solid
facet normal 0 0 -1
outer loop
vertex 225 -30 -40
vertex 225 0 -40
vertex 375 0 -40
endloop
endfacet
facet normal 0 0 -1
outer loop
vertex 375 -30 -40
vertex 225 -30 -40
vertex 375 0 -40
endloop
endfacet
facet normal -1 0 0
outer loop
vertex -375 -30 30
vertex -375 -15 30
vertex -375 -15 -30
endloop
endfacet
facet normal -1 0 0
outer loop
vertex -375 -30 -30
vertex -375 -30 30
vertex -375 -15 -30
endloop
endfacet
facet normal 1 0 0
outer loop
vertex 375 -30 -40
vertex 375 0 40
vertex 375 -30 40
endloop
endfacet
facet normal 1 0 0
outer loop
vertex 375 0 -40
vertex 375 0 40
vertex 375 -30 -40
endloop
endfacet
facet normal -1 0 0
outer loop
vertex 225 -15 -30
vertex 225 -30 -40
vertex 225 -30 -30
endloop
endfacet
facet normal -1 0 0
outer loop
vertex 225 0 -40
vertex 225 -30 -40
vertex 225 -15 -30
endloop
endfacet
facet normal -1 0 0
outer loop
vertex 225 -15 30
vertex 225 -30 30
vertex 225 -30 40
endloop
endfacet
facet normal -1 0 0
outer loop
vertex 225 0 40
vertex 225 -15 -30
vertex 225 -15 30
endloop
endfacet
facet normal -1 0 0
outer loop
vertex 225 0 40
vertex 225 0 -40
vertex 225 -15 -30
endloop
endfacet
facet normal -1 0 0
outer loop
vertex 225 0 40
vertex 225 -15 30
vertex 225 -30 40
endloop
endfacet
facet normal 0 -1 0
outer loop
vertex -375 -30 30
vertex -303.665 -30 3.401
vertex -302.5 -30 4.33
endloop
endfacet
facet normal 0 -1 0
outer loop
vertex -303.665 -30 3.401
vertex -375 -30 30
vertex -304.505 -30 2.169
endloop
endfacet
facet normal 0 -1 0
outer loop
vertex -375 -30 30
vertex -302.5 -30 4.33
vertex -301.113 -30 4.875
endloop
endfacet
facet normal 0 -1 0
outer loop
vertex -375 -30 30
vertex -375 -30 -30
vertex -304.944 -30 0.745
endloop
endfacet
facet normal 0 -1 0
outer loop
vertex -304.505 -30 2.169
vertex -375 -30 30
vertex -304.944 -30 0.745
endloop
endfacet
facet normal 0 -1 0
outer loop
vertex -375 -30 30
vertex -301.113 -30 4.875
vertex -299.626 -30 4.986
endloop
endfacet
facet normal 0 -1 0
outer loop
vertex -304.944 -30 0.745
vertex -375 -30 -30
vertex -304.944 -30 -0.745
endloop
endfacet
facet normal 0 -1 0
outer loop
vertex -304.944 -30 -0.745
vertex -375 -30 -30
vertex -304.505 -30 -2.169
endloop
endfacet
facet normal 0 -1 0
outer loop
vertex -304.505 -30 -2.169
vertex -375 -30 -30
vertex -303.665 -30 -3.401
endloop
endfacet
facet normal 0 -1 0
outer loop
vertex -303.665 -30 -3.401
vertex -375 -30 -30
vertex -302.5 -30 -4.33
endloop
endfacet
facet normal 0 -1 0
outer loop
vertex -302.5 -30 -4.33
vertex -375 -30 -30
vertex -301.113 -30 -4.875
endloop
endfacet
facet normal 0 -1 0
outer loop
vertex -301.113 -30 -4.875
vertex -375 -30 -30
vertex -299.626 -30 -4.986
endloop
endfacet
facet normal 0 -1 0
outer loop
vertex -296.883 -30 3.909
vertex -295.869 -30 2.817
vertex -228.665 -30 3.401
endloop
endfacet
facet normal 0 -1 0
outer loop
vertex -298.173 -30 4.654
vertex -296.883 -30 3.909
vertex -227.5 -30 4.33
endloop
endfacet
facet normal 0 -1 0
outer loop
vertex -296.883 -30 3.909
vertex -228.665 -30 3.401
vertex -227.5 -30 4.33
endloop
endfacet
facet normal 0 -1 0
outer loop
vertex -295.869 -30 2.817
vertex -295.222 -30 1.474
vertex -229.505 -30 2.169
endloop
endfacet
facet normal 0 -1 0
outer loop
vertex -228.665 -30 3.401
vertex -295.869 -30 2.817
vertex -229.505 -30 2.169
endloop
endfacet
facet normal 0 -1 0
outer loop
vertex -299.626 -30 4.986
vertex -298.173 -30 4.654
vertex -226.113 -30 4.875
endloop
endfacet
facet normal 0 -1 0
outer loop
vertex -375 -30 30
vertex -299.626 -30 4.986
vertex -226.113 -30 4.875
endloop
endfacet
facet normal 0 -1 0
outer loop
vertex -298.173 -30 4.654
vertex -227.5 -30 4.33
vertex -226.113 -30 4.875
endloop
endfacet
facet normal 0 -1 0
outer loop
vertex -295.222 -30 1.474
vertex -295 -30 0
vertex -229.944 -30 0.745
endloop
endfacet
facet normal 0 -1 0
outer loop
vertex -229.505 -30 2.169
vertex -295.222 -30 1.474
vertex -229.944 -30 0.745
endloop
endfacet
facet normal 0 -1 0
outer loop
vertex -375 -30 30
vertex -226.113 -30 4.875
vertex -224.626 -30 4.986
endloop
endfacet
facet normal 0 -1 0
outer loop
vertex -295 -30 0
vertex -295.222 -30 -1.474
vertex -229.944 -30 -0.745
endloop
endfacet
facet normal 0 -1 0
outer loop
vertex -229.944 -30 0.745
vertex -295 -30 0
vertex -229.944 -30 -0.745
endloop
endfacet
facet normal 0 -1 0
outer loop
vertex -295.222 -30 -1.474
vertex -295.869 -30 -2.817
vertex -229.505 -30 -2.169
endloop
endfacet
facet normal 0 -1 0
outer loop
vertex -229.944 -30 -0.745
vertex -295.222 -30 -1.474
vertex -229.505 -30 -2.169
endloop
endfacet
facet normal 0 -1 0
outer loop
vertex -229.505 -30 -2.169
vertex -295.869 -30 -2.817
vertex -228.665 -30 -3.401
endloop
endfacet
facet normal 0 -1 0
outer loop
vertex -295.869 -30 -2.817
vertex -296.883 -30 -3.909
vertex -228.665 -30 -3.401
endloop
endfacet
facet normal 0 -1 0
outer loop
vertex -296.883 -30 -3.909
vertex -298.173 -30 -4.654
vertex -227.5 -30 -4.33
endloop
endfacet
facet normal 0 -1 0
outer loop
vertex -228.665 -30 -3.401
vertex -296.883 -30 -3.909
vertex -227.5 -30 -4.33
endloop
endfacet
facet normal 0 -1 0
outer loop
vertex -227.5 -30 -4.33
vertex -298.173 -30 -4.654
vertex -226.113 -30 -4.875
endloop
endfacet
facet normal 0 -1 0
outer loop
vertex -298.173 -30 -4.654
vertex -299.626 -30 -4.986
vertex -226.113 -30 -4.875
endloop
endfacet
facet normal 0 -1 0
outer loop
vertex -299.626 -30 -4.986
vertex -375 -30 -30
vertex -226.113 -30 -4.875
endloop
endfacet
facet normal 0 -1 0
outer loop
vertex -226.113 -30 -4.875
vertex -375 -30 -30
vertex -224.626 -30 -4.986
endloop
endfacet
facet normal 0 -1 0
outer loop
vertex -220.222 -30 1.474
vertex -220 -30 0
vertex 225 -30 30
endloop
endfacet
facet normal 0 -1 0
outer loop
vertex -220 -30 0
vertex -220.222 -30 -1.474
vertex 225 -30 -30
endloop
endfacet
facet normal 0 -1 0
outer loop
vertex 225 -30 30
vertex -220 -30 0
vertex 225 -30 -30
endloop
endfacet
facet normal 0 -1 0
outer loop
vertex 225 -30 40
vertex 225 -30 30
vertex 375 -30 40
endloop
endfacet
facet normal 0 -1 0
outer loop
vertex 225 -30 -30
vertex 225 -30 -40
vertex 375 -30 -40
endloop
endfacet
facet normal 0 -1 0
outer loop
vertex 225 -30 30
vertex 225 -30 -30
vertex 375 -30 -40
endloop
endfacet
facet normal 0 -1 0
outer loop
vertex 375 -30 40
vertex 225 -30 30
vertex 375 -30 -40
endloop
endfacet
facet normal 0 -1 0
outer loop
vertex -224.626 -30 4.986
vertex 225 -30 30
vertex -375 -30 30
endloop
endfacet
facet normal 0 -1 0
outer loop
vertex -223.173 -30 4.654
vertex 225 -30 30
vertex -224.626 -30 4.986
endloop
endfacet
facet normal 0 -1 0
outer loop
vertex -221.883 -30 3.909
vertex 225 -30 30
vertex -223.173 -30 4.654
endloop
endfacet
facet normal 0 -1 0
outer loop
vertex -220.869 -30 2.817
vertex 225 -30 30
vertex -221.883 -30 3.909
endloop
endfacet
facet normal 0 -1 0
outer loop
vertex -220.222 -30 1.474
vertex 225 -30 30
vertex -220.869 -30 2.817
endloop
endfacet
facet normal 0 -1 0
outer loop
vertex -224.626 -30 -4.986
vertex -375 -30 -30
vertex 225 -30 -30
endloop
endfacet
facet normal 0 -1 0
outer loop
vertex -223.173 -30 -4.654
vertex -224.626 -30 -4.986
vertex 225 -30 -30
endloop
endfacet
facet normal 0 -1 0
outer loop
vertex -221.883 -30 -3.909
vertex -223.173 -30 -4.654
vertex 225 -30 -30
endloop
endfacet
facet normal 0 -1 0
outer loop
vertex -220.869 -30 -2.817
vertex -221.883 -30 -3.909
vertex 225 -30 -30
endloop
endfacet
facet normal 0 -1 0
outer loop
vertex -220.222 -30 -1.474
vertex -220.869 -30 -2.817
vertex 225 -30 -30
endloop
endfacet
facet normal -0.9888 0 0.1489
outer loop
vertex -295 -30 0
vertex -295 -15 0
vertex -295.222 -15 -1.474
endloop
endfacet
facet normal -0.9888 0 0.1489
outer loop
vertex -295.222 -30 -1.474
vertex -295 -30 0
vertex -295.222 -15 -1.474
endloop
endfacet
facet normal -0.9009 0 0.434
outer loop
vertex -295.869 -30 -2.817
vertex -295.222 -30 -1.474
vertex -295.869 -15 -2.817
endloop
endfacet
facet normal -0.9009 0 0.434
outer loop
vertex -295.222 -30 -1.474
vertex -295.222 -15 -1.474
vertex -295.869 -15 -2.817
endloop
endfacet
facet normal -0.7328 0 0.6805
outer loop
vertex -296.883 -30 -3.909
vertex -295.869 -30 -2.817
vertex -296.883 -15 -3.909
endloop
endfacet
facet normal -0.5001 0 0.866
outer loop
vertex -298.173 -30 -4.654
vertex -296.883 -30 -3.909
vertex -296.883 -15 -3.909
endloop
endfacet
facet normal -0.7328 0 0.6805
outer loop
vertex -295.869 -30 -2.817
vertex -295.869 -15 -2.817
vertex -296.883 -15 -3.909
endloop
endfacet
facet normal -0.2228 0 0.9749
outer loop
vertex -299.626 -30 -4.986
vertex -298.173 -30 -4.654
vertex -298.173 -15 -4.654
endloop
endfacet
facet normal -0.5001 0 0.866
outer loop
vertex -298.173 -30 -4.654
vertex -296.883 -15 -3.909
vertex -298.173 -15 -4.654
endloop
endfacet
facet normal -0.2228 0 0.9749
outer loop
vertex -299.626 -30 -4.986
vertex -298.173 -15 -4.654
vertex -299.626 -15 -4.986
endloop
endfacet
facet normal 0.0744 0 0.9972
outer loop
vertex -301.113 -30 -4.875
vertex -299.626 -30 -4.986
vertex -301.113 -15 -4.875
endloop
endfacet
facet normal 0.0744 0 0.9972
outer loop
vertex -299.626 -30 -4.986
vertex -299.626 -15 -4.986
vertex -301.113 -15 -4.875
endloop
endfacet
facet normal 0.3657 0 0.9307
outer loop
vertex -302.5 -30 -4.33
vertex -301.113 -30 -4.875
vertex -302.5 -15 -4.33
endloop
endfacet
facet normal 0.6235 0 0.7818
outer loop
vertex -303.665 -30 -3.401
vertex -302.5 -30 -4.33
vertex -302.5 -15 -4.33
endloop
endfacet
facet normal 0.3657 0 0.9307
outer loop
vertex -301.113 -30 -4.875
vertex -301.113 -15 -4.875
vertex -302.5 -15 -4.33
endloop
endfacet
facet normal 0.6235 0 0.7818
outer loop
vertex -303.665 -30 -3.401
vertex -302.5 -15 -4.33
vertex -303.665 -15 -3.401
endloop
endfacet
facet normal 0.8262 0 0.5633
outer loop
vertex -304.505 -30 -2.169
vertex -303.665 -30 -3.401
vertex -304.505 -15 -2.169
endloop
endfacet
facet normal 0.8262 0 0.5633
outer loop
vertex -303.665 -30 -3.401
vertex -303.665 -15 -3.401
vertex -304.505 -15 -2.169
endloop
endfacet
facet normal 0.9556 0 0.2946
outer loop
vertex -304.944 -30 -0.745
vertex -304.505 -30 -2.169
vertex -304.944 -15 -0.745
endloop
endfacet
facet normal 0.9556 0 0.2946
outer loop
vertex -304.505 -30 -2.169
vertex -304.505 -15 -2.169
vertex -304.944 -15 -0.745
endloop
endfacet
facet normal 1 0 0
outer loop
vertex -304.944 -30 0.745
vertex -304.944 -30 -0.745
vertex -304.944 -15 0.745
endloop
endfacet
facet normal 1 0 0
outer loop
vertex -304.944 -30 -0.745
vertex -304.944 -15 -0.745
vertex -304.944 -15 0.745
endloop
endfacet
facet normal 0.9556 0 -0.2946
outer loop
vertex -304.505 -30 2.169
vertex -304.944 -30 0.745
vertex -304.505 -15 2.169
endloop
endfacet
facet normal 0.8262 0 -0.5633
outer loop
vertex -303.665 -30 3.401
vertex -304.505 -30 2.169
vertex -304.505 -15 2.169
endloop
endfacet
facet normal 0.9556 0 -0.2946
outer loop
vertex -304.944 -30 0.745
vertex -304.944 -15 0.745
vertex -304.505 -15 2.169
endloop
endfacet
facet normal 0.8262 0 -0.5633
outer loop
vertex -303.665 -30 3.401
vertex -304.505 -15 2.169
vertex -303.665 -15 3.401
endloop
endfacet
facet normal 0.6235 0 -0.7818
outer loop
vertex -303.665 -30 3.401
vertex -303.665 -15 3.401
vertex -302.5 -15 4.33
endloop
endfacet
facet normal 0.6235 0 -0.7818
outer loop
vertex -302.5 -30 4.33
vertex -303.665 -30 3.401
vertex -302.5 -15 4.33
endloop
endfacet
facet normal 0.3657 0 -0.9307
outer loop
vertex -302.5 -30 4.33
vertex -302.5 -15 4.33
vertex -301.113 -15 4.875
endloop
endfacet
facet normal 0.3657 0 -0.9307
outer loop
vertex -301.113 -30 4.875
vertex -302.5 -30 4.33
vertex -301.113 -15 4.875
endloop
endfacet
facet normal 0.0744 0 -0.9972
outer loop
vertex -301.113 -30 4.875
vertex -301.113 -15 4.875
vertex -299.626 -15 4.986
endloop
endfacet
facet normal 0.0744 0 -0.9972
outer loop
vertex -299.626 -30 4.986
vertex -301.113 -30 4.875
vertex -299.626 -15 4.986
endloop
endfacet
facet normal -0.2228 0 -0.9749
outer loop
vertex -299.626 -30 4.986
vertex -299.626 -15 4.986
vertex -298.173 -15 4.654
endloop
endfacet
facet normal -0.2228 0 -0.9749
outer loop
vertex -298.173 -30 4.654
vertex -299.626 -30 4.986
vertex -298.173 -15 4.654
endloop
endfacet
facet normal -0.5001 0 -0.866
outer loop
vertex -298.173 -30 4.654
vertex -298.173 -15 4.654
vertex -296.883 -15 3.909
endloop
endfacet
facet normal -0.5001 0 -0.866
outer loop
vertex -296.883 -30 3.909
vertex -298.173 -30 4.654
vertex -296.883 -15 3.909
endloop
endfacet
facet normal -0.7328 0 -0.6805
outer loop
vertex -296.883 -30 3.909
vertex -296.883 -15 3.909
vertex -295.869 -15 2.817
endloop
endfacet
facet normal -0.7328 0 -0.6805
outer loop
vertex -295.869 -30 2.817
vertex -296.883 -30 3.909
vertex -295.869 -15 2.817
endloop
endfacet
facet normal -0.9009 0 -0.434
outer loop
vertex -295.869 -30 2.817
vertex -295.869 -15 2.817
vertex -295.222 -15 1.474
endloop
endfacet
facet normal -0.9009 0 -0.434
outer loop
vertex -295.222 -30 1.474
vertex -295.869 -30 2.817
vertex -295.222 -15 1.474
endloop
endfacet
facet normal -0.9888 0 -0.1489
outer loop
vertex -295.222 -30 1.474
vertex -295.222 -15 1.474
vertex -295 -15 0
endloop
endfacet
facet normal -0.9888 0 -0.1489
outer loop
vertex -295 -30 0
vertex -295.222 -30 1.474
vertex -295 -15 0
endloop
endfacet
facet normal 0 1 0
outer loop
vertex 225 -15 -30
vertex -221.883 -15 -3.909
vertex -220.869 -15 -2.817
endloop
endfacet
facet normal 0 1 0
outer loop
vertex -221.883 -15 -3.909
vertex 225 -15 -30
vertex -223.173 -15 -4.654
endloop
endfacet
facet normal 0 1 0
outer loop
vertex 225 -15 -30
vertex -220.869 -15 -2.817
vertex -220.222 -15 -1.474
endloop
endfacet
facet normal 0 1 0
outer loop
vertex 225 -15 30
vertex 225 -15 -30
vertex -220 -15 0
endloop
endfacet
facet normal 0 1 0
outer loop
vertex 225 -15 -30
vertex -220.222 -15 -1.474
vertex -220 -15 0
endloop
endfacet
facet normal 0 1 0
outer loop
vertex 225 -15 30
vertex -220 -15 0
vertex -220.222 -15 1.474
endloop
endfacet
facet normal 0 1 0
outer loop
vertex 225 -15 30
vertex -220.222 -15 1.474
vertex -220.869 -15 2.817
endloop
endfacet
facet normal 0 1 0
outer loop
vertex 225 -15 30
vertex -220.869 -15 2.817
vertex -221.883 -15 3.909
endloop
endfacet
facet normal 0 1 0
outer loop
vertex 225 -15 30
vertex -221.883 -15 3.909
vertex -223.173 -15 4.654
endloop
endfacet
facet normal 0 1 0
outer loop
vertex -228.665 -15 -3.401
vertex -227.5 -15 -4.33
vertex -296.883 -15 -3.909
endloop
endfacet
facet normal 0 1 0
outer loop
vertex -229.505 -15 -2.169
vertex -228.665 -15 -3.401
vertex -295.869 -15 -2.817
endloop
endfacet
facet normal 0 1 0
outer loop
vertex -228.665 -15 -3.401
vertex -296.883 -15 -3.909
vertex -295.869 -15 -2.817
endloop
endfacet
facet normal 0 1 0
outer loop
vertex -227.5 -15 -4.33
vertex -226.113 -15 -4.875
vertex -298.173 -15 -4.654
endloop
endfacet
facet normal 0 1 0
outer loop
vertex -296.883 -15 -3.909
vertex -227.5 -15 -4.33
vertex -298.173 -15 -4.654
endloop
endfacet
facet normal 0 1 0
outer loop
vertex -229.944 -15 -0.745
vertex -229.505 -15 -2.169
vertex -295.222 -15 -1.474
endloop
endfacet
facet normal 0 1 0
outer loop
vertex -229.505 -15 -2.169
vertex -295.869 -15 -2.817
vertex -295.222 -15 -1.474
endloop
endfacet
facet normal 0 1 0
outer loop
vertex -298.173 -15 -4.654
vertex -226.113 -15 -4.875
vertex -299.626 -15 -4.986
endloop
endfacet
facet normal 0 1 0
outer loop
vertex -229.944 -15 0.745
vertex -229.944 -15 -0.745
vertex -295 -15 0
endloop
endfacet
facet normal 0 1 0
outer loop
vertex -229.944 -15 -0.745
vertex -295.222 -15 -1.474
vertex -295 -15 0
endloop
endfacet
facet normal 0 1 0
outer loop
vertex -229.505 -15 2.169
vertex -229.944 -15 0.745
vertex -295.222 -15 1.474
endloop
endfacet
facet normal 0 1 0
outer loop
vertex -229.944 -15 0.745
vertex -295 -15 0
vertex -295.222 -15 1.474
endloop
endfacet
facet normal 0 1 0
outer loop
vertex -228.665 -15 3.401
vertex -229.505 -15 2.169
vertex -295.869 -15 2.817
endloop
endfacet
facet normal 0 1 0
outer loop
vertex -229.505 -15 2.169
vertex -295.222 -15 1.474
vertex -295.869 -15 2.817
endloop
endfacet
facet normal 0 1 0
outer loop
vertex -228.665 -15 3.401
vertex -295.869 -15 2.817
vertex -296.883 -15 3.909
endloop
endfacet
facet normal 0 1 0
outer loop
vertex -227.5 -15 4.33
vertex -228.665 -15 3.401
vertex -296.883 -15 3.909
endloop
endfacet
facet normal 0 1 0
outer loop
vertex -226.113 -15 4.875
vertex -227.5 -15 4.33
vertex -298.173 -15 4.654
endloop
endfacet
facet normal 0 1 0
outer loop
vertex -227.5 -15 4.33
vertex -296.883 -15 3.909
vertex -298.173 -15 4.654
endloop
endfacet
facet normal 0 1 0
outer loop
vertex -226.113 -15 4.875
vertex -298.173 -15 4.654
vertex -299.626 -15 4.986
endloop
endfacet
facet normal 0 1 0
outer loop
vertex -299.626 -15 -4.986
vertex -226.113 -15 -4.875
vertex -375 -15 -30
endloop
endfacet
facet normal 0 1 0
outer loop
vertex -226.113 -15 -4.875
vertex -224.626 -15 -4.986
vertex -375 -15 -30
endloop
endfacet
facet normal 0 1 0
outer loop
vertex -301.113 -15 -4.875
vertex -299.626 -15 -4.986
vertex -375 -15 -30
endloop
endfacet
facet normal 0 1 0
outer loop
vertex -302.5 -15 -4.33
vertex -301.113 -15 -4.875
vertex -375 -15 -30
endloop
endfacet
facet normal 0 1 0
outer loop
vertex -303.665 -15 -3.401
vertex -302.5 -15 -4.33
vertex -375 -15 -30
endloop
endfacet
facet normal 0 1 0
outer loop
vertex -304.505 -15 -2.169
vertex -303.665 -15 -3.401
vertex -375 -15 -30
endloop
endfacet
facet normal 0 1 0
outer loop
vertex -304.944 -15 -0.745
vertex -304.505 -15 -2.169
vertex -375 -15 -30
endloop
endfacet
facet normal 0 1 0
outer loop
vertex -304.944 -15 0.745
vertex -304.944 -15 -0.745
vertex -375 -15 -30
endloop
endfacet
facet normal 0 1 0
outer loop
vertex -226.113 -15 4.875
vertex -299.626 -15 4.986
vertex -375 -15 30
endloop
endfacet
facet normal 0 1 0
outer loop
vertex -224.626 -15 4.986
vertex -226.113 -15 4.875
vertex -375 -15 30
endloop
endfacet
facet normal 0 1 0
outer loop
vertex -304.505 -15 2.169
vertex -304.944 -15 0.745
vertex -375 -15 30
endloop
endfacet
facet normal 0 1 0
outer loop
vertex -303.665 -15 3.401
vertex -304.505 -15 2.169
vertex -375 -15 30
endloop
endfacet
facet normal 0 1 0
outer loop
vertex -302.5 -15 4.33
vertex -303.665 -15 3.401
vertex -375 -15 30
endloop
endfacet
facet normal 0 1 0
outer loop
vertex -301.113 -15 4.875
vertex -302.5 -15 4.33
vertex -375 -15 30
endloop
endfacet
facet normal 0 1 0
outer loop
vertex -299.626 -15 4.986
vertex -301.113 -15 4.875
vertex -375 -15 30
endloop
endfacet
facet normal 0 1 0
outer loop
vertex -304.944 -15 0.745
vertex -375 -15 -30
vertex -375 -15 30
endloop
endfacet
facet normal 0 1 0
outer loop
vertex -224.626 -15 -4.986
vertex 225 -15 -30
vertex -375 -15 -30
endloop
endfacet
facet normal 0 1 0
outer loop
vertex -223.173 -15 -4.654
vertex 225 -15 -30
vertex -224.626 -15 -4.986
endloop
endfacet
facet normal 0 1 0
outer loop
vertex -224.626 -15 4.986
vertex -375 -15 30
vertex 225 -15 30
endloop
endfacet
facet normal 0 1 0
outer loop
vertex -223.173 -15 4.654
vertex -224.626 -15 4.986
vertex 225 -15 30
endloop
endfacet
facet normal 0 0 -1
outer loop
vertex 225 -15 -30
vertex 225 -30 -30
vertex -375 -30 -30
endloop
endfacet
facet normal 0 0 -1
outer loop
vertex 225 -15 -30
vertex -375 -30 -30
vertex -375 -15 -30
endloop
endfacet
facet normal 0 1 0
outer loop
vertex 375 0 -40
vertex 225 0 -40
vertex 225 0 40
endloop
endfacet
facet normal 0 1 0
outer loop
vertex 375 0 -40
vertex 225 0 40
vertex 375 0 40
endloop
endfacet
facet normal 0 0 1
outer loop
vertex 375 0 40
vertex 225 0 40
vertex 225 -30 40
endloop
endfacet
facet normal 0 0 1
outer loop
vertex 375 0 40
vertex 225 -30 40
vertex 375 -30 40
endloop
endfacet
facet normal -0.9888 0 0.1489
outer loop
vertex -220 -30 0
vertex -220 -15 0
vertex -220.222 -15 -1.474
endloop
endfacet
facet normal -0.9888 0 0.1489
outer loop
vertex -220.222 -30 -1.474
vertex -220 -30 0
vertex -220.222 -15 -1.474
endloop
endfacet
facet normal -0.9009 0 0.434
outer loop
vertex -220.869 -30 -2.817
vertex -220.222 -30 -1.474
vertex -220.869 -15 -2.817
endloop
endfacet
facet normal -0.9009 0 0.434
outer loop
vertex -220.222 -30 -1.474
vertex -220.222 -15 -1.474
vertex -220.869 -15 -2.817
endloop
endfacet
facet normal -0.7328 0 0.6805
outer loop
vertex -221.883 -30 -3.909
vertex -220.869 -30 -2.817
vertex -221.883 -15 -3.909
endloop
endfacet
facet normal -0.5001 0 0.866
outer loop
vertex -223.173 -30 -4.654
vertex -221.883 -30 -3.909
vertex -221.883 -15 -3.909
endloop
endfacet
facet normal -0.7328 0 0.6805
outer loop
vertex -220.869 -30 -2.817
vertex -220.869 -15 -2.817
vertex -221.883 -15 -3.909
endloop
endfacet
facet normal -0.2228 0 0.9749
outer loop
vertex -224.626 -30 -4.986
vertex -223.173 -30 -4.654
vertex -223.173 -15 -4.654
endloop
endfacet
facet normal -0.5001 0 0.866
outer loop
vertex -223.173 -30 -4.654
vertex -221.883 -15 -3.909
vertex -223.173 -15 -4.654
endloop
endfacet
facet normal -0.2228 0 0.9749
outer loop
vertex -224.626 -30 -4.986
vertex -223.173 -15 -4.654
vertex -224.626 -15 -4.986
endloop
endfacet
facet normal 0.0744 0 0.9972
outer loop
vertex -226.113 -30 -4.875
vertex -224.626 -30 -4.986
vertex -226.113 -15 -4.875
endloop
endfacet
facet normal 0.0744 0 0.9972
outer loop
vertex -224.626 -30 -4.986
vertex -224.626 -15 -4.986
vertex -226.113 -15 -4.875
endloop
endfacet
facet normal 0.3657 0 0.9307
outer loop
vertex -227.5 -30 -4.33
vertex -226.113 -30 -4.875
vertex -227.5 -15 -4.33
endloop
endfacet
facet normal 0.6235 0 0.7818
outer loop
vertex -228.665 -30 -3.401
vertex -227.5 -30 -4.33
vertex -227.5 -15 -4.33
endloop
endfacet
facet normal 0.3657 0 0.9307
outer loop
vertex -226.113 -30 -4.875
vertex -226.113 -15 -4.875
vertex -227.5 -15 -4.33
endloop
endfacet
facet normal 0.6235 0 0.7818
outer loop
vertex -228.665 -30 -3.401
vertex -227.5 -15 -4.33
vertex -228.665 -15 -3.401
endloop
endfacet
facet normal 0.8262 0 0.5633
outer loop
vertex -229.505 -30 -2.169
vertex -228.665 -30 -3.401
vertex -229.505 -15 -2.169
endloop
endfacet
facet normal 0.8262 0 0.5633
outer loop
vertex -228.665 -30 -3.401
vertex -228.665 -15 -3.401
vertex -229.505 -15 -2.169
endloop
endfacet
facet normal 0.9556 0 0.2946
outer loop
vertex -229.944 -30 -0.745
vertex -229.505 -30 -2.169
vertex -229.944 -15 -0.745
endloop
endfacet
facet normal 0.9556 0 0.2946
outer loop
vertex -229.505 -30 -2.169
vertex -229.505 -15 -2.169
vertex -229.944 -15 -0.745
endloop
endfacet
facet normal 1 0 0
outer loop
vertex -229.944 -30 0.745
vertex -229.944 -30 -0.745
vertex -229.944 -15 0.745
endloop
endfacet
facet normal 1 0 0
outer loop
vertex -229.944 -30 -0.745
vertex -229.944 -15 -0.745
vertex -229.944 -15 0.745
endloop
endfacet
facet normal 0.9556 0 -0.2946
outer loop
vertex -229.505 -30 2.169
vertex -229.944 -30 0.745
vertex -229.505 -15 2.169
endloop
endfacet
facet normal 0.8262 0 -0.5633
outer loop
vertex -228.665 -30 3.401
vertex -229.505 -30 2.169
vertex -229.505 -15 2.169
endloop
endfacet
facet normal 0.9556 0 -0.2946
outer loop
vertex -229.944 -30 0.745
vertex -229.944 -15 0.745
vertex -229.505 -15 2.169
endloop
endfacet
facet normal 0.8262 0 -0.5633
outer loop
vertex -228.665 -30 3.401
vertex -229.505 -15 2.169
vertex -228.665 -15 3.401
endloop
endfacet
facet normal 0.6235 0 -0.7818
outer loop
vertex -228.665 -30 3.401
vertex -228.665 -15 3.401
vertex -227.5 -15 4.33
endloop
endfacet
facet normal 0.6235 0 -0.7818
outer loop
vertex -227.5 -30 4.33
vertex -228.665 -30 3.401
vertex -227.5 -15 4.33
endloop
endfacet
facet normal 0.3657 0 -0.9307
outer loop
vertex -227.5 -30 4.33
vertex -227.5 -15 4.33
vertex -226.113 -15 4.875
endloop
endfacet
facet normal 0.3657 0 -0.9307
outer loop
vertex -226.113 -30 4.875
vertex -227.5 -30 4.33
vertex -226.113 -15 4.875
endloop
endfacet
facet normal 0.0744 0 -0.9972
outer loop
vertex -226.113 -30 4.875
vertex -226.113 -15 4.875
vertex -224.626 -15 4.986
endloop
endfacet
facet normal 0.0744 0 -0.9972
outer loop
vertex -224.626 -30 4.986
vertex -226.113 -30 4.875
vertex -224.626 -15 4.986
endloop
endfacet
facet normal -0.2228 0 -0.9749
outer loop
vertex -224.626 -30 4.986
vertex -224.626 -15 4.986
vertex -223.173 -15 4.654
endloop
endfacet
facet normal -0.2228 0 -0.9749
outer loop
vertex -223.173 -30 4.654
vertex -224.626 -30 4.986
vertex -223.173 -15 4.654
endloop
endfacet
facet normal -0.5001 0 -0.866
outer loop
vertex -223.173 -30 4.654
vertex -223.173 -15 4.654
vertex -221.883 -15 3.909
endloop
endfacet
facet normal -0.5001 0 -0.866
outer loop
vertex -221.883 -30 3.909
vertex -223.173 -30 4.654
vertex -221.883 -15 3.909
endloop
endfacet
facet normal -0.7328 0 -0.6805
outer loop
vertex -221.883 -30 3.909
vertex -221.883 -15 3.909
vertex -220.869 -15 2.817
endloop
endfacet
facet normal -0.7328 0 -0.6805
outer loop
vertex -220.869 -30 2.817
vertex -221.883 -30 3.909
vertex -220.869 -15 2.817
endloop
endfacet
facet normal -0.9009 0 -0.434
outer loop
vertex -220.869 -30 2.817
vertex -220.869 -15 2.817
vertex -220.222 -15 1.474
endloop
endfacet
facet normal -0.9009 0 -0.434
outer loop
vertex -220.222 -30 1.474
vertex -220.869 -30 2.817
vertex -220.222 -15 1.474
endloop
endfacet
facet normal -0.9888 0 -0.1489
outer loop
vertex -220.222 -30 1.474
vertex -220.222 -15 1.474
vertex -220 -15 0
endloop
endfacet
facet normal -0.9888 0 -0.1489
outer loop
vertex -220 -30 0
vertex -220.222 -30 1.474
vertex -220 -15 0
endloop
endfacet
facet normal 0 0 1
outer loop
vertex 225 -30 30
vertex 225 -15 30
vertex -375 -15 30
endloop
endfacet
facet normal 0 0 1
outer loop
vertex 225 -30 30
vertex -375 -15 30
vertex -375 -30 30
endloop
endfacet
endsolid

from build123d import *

# Parameters (mm, degrees)
IZIM1_W                     = 750
IZIM1_H                     = 80
IZIM1_R                     = 5
Y_KSEKLIK_EKSTR_ZYON1_DEPTH = 30
KES_EKSTR_ZYON1_DEPTH       = 600


with BuildPart() as part:
    # Çizim1 → Yükseklik-Ekstrüzyon1 (new body)
    with BuildSketch(Plane(origin=(0, 0, 0), x_dir=(1, 0, 0), z_dir=(0, 1, 0))):
        Rectangle(IZIM1_W, IZIM1_H)
        with Locations((-300, 0)):
            Circle(IZIM1_R, mode=Mode.SUBTRACT)
        with Locations((-225, 0)):
            Circle(IZIM1_R, mode=Mode.SUBTRACT)
    extrude(amount=-Y_KSEKLIK_EKSTR_ZYON1_DEPTH)

    # Çizim3 → Kes-Ekstrüzyon1 (cut)
    with BuildSketch(Plane.ZY.offset(375)):
        Polygon((-30, -30), (-30, -15), (30, -15), (30, -30), (40, -30), (40, 0), (-40, 0), (-40, -30), align=None)
    extrude(amount=-KES_EKSTR_ZYON1_DEPTH, mode=Mode.SUBTRACT)


solid = part.part
